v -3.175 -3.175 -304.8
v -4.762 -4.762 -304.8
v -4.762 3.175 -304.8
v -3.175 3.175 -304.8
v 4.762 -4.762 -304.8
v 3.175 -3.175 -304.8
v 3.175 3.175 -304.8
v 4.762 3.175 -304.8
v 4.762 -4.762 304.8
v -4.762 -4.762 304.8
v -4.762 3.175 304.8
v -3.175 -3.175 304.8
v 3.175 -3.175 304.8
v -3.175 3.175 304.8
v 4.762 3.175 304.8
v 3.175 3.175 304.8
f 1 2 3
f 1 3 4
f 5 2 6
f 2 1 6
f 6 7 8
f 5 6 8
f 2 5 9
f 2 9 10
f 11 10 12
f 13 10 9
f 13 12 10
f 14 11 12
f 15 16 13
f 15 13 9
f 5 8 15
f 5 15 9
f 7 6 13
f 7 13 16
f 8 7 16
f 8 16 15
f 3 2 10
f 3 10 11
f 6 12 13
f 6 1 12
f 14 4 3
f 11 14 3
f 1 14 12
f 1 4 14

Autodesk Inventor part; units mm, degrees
ref_plane "YZ Plane" through (0, 0, 0) normal (1, 0, 0) x (0, 1, 0)
ref_plane "XZ Plane" through (0, 0, 0) normal (0, 1, 0) x (-1, 0, 0)
ref_plane "XY Plane" through (0, 0, 0) normal (0, 0, 1) x (1, 0, 0)
sketch "Sketch1" plane through (0, 0, 0) normal (0, 0, 1) x (1, 0, 0)
  line L0 (-6.6675, 0) -> (6.6675, 0) projected
  line L1 (0, -6.35) -> (0, 4.7625) projected
  line L2 (-3.175, 3.175) -> (-3.175, -3.175)
  line L3 (-3.175, -3.175) -> (3.175, -3.175)
  line L4 (3.175, -3.175) -> (3.175, 3.175)
  line L5 (4.7625, 3.175) -> (4.7625, -4.7625)
  line L6 (4.7625, -4.7625) -> (-4.7625, -4.7625)
  line L7 (-4.7625, -4.7625) -> (-4.7625, 3.175)
  line L8 (-3.175, 3.175) -> (-4.7625, 3.175)
  line L9 (3.175, 3.175) -> (4.7625, 3.175)
  point P0 (0, 0)
  point P1 (0, -3.175)
  point P2 (-3.175, 0)
  dimension "d0" = 1.5875
  dimension "d1" = 6.35
  dimension "d2" = 6.35
extrude "Extrusion1" add sketch "Sketch1" along normal mid plane 609.6 contours L7 L8 L2 L0 | L0 L2 L3 L1 L6 L7 | L1 L3 L4 L0 L5 L6 | L4 L9 L5 L0
properties part number "c-channel template" material "Aluminum-6061"
